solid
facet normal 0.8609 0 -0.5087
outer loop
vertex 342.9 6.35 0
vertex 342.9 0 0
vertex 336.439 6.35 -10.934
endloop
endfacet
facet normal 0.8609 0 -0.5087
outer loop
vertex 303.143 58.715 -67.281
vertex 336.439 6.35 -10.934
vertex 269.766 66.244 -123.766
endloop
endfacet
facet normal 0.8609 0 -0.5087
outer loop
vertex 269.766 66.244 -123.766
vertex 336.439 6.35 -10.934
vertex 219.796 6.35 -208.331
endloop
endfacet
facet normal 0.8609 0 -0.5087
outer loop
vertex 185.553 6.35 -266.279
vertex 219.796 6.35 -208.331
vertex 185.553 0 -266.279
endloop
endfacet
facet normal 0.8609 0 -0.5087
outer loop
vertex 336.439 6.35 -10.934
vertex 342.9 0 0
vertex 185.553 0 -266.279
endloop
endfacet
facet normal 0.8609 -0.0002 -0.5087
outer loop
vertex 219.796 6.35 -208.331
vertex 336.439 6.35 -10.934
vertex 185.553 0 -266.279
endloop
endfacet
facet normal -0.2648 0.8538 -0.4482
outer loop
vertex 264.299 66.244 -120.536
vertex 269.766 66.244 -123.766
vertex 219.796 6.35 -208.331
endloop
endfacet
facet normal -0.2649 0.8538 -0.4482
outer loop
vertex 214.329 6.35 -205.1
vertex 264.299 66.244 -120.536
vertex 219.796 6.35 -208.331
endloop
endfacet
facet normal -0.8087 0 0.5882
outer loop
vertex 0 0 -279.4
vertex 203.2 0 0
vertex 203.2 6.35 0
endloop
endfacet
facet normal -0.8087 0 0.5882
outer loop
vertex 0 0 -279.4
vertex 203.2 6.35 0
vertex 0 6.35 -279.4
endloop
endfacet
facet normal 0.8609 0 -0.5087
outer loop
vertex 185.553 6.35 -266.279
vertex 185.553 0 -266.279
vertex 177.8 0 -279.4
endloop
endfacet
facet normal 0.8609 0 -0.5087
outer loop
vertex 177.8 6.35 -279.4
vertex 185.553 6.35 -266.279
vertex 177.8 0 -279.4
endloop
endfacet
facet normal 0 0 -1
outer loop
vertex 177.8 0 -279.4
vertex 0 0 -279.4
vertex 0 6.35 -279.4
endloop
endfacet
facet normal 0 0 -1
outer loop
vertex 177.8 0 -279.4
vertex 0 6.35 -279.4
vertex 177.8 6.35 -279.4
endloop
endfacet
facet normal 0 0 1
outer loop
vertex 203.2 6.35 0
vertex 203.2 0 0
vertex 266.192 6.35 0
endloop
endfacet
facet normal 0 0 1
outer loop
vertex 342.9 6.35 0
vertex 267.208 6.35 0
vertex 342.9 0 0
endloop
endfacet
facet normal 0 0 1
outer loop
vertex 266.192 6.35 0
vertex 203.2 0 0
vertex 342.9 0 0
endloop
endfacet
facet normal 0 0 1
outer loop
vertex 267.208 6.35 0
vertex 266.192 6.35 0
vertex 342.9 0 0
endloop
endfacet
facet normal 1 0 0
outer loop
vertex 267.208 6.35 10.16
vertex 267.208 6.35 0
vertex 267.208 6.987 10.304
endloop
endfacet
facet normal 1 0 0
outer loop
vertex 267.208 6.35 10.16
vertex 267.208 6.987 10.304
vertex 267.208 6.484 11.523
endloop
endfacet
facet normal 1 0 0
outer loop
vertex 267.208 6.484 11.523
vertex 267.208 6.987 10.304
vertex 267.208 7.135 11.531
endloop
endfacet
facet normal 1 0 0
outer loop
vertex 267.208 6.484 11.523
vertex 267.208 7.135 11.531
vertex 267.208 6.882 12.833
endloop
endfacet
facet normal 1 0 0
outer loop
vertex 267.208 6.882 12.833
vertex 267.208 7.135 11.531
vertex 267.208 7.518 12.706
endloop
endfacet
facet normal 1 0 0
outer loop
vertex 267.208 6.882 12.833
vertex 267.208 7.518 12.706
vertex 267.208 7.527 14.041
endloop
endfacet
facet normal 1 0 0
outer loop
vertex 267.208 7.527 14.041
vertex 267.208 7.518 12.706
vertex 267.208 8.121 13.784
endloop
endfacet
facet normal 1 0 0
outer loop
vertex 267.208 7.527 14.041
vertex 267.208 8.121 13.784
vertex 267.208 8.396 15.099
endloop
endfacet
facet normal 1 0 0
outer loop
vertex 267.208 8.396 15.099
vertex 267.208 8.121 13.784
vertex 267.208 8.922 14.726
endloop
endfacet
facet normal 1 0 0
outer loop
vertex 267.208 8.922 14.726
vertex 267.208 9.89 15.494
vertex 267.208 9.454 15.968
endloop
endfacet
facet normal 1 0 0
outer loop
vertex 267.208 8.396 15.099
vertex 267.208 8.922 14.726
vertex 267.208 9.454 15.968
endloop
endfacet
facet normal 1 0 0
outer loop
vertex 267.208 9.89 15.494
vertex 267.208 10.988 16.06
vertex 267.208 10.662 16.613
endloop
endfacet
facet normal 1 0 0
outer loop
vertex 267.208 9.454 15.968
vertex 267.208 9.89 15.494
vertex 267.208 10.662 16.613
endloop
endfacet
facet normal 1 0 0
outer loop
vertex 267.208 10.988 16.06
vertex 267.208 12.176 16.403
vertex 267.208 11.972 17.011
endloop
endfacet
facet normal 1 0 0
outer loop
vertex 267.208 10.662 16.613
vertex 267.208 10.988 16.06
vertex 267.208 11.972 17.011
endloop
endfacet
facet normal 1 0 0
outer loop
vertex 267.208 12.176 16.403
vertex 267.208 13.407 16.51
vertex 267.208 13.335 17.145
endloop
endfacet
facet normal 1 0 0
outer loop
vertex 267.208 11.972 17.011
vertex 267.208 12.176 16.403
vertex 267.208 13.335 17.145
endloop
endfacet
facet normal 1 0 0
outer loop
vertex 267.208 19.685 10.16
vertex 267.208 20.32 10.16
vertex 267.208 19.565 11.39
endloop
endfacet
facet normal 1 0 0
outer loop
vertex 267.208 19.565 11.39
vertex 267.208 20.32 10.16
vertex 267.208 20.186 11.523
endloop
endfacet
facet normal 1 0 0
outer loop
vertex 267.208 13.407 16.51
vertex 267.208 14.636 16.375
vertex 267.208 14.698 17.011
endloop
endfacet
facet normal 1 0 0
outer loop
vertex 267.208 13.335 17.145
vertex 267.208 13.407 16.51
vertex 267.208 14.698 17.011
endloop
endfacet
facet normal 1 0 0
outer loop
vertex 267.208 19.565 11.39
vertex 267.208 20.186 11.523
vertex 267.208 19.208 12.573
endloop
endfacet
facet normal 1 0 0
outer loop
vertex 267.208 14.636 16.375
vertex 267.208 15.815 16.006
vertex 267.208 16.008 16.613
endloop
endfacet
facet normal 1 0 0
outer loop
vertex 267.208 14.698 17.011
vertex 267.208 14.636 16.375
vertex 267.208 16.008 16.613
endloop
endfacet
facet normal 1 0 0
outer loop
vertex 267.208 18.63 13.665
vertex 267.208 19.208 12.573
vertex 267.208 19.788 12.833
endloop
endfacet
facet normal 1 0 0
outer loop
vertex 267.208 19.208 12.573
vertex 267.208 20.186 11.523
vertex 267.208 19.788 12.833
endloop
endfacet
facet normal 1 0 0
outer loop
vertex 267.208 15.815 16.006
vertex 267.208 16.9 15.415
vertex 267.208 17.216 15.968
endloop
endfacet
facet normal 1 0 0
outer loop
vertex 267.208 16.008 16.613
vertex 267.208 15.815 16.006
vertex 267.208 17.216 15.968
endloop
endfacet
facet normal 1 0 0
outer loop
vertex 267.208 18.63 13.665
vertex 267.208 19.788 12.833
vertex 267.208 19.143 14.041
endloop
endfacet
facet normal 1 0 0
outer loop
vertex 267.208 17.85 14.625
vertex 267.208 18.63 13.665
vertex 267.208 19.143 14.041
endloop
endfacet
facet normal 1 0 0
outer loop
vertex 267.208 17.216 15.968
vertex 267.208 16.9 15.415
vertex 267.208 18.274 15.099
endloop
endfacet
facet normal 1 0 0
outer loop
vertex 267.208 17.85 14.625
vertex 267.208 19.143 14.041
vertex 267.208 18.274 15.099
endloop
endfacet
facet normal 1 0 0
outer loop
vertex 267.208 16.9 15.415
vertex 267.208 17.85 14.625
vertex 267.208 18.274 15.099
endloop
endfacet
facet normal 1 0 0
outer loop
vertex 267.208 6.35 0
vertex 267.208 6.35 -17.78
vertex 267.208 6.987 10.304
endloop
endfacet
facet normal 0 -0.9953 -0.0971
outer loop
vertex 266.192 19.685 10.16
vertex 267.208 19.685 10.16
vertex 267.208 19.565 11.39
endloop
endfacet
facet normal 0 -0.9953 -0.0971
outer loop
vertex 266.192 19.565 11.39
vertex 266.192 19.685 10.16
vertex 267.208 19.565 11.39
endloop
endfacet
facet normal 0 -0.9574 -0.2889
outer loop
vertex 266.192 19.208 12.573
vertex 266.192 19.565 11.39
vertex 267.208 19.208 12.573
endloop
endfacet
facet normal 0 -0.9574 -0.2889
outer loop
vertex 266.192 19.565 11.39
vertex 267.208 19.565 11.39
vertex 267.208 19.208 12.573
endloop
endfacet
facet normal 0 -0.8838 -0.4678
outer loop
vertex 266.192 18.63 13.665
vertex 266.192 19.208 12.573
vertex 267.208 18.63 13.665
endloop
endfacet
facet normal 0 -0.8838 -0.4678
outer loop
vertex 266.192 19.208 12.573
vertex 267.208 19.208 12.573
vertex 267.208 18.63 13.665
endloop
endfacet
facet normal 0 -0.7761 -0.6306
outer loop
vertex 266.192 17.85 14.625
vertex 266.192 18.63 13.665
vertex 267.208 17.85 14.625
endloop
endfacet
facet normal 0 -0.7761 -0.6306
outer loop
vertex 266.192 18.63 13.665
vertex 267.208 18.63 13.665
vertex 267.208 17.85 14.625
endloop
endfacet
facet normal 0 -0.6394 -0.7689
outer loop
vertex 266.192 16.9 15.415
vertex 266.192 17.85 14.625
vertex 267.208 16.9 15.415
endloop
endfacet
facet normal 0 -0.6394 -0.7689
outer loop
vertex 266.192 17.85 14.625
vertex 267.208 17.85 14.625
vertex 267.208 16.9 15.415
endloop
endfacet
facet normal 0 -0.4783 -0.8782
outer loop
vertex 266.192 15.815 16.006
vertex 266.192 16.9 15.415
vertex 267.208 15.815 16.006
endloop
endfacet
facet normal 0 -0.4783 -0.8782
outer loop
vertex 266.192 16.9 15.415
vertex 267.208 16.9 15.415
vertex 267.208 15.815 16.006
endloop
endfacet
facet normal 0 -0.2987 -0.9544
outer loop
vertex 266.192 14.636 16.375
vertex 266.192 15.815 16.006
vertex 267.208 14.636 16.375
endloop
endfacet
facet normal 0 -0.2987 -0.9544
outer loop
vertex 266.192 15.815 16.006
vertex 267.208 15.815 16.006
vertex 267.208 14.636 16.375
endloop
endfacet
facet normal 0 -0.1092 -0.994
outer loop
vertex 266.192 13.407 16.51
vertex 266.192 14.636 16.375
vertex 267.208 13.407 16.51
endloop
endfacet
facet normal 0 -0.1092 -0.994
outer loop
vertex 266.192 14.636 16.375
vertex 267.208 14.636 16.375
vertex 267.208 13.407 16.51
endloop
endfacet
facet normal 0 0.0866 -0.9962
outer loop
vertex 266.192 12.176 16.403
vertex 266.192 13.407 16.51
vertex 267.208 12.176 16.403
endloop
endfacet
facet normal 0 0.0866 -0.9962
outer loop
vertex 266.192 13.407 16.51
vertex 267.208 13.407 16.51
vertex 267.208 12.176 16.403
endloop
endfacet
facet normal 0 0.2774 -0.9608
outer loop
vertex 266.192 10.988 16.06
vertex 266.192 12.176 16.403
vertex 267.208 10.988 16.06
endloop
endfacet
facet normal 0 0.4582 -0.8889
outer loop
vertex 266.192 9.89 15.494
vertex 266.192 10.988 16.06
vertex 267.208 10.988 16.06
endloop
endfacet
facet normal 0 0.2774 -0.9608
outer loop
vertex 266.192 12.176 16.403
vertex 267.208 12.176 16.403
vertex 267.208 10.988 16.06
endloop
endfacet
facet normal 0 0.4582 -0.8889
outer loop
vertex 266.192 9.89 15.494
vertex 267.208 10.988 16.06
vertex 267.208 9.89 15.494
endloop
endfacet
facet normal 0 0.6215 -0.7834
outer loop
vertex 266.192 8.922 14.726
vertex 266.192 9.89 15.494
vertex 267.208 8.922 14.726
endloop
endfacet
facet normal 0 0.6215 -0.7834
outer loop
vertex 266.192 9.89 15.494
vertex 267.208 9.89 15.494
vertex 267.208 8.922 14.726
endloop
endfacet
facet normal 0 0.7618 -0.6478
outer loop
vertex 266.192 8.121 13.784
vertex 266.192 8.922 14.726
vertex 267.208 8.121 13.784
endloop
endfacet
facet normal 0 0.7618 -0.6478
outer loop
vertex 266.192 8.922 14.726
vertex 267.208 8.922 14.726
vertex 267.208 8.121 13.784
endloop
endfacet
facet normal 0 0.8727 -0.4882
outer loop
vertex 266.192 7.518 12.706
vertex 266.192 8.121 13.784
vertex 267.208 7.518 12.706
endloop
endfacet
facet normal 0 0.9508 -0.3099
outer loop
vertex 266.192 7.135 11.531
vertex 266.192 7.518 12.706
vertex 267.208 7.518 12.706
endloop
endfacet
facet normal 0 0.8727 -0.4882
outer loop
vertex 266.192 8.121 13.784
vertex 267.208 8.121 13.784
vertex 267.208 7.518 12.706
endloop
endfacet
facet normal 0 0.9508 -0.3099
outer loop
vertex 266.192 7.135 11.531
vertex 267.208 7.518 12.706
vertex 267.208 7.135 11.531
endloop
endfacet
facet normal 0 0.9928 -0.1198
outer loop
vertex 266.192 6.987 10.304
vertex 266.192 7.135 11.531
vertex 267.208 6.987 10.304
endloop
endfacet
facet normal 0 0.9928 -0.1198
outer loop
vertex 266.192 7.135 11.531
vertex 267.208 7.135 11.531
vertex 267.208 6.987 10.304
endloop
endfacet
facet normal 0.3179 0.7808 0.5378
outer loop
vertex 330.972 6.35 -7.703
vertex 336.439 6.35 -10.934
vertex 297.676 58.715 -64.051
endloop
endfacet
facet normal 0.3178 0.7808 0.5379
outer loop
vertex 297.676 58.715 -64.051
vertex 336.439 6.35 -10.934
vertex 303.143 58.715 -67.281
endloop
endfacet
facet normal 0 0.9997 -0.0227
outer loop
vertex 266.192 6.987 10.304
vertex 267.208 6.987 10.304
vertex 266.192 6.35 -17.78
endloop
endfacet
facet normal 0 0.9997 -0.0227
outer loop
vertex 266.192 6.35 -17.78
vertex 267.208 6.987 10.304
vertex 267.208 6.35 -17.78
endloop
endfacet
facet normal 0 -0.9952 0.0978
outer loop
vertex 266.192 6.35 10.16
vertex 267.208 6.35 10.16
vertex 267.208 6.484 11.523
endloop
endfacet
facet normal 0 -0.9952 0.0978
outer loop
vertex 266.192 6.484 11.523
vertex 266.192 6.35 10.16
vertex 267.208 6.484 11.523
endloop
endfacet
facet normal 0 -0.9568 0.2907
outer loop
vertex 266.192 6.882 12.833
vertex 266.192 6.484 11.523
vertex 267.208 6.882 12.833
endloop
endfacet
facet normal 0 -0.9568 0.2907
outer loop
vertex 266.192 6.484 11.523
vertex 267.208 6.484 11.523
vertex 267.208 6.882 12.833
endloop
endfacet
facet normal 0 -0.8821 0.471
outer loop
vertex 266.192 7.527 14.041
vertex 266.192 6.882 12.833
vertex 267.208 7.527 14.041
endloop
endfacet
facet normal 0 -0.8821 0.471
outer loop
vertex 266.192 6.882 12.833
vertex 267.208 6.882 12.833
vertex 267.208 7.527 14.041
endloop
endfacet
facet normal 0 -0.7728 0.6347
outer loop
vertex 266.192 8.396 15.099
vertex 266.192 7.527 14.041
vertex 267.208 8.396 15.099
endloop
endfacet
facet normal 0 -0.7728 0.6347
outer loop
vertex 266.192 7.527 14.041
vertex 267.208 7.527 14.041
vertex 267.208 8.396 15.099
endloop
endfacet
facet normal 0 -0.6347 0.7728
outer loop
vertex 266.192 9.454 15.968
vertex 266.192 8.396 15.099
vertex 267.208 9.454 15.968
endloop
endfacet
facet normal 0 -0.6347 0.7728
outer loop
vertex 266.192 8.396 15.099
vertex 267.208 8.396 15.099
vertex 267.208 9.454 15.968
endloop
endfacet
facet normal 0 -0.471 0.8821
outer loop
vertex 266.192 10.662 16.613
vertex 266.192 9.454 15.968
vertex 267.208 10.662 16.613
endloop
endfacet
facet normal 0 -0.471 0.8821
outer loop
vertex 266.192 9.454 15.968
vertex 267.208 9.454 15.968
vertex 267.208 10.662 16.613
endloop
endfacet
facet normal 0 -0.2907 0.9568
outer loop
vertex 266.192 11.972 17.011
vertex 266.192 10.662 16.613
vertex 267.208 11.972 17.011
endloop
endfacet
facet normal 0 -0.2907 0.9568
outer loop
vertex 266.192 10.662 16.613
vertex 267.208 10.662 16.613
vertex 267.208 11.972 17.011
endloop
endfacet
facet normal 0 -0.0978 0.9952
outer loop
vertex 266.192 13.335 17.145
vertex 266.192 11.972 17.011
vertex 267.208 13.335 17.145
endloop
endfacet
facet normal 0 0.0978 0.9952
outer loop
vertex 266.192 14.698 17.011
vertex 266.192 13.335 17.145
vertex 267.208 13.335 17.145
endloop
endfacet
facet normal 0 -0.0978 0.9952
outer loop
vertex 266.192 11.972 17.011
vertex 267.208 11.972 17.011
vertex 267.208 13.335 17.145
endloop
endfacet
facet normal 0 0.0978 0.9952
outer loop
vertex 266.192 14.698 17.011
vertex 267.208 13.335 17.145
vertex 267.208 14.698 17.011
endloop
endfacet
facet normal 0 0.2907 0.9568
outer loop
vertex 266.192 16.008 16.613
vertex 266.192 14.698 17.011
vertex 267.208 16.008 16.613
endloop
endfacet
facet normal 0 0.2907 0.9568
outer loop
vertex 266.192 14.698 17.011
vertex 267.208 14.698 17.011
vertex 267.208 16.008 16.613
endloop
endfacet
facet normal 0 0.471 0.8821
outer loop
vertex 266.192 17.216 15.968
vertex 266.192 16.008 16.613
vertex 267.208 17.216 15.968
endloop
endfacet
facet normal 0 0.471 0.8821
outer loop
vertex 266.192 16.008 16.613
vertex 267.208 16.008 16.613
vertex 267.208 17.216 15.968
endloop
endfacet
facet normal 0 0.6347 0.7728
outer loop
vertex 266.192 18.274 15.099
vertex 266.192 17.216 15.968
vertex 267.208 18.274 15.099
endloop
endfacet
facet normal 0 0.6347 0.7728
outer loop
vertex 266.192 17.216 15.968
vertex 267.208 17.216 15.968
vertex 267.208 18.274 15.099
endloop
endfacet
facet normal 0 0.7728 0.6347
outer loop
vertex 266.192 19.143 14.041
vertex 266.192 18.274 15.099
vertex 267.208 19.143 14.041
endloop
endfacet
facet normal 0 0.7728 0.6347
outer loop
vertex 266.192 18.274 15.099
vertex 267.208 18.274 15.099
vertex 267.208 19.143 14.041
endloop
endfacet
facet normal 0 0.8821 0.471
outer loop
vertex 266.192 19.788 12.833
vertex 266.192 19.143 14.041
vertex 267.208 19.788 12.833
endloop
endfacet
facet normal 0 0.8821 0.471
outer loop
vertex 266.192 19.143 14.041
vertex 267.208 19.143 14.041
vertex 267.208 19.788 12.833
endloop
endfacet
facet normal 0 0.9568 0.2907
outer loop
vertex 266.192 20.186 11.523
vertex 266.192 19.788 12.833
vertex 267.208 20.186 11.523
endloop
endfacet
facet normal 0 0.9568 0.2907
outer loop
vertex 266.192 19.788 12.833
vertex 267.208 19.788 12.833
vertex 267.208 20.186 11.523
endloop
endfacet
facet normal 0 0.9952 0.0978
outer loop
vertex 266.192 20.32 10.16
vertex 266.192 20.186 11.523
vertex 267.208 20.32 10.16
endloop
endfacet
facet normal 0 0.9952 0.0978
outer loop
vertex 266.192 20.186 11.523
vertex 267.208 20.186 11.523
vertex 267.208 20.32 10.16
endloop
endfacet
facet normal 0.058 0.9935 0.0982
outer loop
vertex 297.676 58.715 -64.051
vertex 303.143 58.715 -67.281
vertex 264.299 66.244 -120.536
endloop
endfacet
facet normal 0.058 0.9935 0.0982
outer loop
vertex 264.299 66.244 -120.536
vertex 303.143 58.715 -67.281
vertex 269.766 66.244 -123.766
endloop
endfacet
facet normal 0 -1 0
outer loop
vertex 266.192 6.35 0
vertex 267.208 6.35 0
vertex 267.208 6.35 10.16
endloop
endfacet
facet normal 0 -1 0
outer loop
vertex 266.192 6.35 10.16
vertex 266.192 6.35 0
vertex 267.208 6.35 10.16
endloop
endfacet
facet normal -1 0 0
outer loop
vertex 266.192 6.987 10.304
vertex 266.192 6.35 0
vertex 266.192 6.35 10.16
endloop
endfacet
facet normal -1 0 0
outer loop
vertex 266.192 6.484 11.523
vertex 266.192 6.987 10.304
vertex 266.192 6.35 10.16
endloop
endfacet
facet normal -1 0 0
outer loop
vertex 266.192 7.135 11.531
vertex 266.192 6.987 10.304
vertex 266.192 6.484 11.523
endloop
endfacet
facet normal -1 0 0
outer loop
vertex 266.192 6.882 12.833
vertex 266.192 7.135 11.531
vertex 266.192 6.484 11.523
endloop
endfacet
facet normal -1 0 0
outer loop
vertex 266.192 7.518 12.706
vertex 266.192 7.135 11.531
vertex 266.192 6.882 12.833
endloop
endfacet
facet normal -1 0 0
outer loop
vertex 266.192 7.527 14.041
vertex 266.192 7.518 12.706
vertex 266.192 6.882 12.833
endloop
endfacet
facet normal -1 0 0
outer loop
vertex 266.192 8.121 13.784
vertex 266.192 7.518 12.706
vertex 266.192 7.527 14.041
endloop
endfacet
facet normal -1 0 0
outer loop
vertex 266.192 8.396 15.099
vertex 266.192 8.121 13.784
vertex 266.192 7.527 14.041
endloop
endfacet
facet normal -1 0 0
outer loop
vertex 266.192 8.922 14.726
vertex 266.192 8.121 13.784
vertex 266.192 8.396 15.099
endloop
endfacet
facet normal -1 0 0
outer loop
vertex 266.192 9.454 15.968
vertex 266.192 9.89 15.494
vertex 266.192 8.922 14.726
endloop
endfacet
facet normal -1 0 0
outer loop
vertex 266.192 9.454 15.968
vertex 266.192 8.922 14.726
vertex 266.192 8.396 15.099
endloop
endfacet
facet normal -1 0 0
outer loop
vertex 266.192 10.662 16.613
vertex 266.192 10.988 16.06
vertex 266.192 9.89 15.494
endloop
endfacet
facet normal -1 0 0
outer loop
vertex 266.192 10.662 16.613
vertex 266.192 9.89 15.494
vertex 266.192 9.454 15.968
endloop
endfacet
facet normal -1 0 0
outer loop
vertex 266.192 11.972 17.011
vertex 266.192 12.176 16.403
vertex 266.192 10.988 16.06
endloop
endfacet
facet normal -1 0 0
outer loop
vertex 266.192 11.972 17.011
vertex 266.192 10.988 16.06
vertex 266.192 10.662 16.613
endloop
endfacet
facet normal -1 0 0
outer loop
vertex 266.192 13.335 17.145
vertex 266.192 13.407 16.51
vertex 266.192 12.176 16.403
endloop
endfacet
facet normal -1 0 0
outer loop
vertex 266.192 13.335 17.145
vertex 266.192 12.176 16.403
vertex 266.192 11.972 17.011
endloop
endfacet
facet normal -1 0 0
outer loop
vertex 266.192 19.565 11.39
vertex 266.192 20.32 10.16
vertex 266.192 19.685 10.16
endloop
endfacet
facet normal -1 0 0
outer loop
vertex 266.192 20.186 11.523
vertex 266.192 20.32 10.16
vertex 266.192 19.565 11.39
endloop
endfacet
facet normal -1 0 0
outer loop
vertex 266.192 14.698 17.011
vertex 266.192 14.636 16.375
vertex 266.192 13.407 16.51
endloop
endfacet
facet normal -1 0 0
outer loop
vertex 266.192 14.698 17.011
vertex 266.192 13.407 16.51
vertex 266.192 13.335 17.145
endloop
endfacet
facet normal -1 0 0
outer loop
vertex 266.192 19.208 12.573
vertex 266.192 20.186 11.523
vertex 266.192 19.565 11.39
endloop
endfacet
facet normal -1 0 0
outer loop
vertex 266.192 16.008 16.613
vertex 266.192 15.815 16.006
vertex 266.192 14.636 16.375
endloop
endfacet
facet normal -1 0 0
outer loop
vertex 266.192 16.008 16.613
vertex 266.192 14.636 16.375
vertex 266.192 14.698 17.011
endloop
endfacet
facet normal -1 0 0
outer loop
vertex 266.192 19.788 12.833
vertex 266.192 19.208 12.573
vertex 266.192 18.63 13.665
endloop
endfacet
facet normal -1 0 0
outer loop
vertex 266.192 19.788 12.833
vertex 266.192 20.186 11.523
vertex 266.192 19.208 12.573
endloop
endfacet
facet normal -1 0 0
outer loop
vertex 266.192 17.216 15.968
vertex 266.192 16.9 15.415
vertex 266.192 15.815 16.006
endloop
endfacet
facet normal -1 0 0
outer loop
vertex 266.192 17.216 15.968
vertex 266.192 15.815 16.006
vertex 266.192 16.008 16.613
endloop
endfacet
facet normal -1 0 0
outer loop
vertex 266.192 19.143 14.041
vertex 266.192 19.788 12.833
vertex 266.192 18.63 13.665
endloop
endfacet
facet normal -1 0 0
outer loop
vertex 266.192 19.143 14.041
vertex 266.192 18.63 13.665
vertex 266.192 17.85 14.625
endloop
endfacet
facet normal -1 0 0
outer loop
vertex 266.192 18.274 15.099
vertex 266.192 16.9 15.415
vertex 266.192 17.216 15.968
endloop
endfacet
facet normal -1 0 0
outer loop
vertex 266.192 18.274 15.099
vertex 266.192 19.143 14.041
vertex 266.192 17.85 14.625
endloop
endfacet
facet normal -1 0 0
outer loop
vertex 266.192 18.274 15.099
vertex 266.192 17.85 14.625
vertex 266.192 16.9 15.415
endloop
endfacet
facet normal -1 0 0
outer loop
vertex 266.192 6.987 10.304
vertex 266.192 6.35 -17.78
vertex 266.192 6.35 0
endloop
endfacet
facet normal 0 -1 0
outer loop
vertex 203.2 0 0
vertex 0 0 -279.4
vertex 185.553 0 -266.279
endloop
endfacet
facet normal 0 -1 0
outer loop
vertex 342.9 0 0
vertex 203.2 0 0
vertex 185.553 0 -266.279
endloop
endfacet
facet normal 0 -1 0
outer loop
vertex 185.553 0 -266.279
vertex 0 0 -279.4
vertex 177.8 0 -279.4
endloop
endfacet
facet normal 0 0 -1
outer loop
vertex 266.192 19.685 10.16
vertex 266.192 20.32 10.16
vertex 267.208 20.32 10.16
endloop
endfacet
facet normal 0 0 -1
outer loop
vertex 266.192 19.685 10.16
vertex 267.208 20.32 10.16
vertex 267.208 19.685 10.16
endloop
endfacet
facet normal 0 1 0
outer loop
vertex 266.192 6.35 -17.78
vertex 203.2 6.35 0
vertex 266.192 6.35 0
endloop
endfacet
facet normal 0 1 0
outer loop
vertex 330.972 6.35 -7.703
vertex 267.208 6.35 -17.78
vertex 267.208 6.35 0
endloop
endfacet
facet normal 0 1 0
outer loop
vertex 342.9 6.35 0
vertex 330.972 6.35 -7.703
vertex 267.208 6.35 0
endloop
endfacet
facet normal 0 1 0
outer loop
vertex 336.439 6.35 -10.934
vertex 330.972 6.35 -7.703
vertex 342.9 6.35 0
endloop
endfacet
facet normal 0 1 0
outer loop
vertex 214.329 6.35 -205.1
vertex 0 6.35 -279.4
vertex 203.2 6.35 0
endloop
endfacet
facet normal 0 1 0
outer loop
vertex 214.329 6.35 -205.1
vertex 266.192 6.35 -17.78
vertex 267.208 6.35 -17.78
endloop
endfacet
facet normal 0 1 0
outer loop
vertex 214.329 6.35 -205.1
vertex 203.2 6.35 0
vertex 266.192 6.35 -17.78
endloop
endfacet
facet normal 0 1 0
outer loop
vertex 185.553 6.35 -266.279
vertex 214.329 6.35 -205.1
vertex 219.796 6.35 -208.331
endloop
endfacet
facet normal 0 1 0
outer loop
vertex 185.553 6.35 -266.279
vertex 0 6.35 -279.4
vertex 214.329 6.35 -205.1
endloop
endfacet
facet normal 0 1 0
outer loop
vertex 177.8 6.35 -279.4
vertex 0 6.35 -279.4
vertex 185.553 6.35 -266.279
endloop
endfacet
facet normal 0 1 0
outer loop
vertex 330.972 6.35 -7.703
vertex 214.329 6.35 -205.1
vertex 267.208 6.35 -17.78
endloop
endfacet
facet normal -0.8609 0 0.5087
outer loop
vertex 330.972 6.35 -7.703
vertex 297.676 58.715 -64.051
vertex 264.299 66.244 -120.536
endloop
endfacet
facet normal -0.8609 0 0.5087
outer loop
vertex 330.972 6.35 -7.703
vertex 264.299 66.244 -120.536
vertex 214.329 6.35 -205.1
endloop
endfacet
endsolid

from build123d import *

# Parameters (mm, degrees)
SKETCH_W            = 533.4
SKETCH_H            = 279.4
EXTRUDE_2_DEPTH     = 6.35
EXTRUDE4_DEPTH      = 0.508
EXTRUDE4_DEPTH_BACK = 0.508
EXTRUDE5_DEPTH      = 76.2
EXTRUDE6_DEPTH      = 6.35
CUT_EXTRUDE1_DEPTH  = 23.368


with BuildPart() as part:
    # Sketch → Extrude 2 (new body)
    with BuildSketch(Plane(origin=(0, 0, 0), x_dir=(1, 0, 0), z_dir=(0, 1, 0))):
        with Locations((266.7, 139.7)):
            Rectangle(SKETCH_W, SKETCH_H)
    extrude(amount=EXTRUDE_2_DEPTH)

    # Sketch5 → Extrude4 (add, two sides: drawn at the far end of the back side and taken through both)
    with BuildSketch(Plane.ZY.offset(-266.7).offset(-EXTRUDE4_DEPTH_BACK)):
        with BuildLine():
            Line((0, 6.35), (10.16, 6.35))
            ThreePointArc((10.16, 6.35), (17.145, 13.335), (10.16, 20.32))
            Line((10.16, 20.32), (10.16, 19.685))
            ThreePointArc((10.16, 19.685), (16.509592253, 13.406959845), (10.303910448, 6.986630935))
            Line((10.303910448, 6.986630935), (-17.78, 6.35))
            Line((-17.78, 6.35), (0, 6.35))
        make_face()
    extrude(amount=EXTRUDE4_DEPTH + EXTRUDE4_DEPTH_BACK)

    # Sketch6 → Extrude5 (cut)
    with BuildSketch(Plane.XZ):
        Polygon((185.553034717, -266.27947971), (177.8, -279.4), (185.42, -279.4), (533.4, -279.4), (533.4, 0), (342.9, 0), align=None)
        Polygon((0, 0), (203.2, 0), (0, -279.4), align=None)
    extrude(amount=-EXTRUDE5_DEPTH, mode=Mode.SUBTRACT)

    # Sketch7 → Extrude6 (add)
    with BuildSketch(Plane(origin=(254.155589587, 0, -150.182848392), x_dir=(-0.5087293121266415, 0, -0.8609265282143153), z_dir=(0.8609265282143153, 0, -0.5087293121266415))):
        Polygon((-161.743281128, 6.35), (-62.577151256, 85.691531912), (67.540800287, 6.35), align=None)
    extrude(amount=-EXTRUDE6_DEPTH)

    # Sketch8 → Cut-Extrude1 (cut)
    with BuildSketch(Plane(origin=(254.155589587, 0, -150.182848392), x_dir=(-0.5087293121266415, 0, -0.8609265282143153), z_dir=(0.8609265282143153, 0, -0.5087293121266415))):
        Polygon((-96.293635413, 58.715411062), (-30.684203238, 66.244289445), (-62.577151256, 85.691531912), align=None)
    extrude(amount=-CUT_EXTRUDE1_DEPTH, mode=Mode.SUBTRACT)


solid = part.part
